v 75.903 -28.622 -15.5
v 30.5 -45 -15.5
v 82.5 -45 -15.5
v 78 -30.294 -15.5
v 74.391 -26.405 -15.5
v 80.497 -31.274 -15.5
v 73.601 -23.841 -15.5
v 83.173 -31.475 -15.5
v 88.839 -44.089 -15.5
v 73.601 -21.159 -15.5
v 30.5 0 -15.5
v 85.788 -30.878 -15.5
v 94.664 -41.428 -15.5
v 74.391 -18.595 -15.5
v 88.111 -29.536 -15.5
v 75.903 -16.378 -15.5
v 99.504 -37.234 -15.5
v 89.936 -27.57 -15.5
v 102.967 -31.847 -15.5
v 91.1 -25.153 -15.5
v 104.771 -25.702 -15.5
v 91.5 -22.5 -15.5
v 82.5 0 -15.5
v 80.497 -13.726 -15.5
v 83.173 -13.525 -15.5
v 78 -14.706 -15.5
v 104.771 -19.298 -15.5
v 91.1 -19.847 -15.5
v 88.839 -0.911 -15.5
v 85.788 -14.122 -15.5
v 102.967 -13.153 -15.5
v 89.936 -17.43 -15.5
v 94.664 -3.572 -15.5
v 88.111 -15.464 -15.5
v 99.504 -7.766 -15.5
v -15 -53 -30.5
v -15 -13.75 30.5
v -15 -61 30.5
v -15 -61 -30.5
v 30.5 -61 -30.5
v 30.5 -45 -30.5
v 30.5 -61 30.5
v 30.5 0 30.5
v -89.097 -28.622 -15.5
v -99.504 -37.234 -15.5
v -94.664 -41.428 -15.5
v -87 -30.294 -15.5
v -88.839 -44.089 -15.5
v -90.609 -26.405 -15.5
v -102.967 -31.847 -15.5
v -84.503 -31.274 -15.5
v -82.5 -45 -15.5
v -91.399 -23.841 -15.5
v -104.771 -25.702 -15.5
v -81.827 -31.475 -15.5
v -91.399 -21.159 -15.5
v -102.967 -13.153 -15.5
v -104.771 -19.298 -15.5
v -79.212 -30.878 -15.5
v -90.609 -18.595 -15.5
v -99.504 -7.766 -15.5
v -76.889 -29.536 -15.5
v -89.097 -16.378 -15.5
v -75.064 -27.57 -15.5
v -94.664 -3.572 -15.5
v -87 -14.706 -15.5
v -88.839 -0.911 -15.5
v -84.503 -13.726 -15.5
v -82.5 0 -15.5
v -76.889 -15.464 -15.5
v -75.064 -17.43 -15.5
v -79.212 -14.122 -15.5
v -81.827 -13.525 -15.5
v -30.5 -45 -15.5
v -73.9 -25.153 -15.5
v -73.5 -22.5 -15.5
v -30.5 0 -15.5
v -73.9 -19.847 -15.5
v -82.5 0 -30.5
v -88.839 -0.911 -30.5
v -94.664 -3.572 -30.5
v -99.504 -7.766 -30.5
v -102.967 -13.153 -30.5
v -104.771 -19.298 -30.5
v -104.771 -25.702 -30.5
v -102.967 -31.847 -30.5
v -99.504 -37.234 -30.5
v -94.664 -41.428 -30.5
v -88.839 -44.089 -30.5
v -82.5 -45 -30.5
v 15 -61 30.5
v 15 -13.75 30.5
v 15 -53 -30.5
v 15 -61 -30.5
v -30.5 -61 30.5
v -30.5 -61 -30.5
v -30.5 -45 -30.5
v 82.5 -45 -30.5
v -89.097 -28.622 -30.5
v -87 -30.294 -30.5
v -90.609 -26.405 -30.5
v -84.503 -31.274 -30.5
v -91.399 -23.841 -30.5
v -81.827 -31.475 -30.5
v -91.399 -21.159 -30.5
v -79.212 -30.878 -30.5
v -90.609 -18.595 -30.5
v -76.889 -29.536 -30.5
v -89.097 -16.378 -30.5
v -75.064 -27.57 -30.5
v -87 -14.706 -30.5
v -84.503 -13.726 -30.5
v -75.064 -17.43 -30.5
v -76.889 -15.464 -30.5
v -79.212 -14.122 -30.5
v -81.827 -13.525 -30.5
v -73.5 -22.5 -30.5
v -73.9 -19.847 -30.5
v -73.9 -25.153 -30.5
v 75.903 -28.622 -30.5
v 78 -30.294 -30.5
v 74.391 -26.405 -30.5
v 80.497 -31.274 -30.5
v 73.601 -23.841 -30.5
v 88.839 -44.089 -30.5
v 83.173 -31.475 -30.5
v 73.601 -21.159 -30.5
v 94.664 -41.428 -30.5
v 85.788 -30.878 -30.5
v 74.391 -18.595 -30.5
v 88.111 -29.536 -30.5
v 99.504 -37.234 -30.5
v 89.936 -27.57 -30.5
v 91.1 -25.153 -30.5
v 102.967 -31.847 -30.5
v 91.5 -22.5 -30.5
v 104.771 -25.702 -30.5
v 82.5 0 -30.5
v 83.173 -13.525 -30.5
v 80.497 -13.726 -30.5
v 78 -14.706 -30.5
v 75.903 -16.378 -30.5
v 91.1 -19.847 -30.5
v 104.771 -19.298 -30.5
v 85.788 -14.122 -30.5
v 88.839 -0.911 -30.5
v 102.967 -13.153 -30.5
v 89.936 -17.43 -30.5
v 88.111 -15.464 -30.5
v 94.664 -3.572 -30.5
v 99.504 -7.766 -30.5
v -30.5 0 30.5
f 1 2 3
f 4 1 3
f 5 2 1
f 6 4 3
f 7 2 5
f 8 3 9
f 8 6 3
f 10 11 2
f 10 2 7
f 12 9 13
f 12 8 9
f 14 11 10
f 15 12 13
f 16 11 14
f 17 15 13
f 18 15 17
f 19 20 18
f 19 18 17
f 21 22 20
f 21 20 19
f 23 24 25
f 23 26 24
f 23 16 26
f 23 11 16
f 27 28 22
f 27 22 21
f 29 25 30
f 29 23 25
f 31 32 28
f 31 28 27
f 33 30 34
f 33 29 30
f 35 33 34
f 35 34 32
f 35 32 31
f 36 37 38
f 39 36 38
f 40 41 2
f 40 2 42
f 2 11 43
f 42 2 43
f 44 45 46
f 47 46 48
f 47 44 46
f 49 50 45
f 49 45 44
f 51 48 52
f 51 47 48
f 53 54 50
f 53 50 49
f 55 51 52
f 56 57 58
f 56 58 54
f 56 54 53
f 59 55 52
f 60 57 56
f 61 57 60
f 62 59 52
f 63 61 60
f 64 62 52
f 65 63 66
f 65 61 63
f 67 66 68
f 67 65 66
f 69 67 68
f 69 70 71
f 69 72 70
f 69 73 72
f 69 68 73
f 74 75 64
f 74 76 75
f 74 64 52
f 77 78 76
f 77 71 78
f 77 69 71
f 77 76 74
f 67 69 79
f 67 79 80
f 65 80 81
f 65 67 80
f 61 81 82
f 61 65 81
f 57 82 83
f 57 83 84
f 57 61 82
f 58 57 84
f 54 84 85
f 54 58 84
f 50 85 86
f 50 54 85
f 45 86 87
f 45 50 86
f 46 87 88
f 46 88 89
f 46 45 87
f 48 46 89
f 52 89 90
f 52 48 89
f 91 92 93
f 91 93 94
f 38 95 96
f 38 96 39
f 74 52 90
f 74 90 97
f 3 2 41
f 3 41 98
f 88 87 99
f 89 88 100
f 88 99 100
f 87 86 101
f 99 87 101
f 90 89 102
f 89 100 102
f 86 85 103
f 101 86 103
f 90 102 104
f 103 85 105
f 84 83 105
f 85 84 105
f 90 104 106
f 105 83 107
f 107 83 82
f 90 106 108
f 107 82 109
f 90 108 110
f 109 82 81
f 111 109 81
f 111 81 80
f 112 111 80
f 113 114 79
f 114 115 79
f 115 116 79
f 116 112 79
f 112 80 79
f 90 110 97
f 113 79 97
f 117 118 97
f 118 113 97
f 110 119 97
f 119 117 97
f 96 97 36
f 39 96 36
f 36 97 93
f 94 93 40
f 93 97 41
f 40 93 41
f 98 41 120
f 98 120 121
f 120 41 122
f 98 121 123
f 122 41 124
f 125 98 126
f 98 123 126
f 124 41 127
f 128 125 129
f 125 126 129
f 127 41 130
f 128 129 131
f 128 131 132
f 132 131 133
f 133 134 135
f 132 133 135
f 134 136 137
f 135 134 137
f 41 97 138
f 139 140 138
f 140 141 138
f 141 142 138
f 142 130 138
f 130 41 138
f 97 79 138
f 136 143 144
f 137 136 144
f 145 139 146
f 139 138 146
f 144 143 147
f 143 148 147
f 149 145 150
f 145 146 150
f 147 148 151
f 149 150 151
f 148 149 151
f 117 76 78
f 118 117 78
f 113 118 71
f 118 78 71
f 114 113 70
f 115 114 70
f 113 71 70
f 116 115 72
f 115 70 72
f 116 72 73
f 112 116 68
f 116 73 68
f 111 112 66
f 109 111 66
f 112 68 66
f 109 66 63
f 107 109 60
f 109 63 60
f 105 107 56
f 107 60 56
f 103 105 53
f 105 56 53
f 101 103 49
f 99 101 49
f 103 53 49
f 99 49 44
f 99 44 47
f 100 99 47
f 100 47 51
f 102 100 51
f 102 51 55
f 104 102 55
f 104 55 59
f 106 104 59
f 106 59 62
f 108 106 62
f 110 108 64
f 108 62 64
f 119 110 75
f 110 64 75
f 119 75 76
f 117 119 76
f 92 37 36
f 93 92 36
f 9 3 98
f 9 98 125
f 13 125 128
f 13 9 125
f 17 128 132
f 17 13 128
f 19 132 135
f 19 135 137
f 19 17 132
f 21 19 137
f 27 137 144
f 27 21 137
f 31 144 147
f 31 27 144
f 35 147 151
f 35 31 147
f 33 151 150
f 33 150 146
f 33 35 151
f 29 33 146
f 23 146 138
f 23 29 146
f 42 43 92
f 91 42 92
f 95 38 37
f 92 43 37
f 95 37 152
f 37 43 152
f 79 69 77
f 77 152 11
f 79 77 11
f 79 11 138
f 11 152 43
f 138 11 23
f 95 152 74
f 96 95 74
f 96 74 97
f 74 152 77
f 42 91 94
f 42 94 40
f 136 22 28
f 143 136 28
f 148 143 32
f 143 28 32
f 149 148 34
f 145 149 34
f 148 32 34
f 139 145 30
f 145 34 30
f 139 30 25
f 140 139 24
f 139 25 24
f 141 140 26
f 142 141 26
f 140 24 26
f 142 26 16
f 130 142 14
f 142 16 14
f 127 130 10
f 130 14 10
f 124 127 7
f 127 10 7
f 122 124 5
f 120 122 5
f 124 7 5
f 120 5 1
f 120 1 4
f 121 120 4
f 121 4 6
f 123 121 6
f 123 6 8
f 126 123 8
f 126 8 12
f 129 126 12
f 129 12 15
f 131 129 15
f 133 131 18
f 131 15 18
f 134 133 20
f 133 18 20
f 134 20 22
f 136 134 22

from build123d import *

# Parameters (mm, degrees)
F0_W      = 52
F0_H      = 15
F1_DEPTH  = 45
F2_DEPTH  = 61
F4_DEPTH  = 15
F6_R      = 9
F5_R      = 9
F7_DEPTH  = 15
F10_DEPTH = 30


with BuildPart() as f1:
    # F0 (on Front) → F1 (new body)
    with BuildSketch(Plane.XZ):
        with Locations((-56.5, -23)):
            Rectangle(F0_W, F0_H)
    extrude(amount=F1_DEPTH)



with BuildPart() as f1b:
    # F0 (on Front) → F1, piece 2 (new body)
    with BuildSketch(Plane.XZ):
        with Locations((56.5, -23)):
            Rectangle(F0_W, F0_H)
    extrude(amount=F1_DEPTH)


with BuildPart() as f1_1:
    add(f1.part)

    add(f1b.part)  # F2 merges F1b
    # F0 (on Front) → F2 (join)
    with BuildSketch(Plane.XZ):
        Polygon((30.5, 30.5), (-30.5, 30.5), (-30.5, -15.5), (-30.5, -30.5), (30.5, -30.5), (30.5, -15.5), align=None)
    extrude(amount=F2_DEPTH)

    # F3 (on face) → F4 (join)
    with BuildSketch(Plane.XY.offset(-15.5)):
        with BuildLine():
            Line((-82.5, -45), (-82.5, 0))
            ThreePointArc((-82.5, 0), (-105, -22.5), (-82.5, -45))
        make_face()
        with BuildLine():
            Line((82.5, 0), (82.5, -45))
            ThreePointArc((82.5, -45), (105, -22.5), (82.5, 0))
        make_face()
    extrude(amount=-F4_DEPTH)

    # F6 (on face) + F5 (on face) → F7 (cut)
    with BuildSketch(Plane.XY.offset(-15.5)):
        with Locations((82.5, -22.5)):
            Circle(F6_R)
    with BuildSketch(Plane.XY.offset(-15.5)):
        with Locations((-82.5, -22.5)):
            Circle(F5_R)
    extrude(amount=-F7_DEPTH, mode=Mode.SUBTRACT)

    # F9 (on offset) → F10 (cut)
    with BuildSketch(Plane(origin=(-15, 0, 0), x_dir=(0, -1, 0), z_dir=(-1, 0, 0))):
        Polygon((61, 30.5), (13.75, 30.5), (53, -30.5), (61, -30.5), align=None)
    extrude(amount=-F10_DEPTH, mode=Mode.SUBTRACT)


solid = f1_1.part
